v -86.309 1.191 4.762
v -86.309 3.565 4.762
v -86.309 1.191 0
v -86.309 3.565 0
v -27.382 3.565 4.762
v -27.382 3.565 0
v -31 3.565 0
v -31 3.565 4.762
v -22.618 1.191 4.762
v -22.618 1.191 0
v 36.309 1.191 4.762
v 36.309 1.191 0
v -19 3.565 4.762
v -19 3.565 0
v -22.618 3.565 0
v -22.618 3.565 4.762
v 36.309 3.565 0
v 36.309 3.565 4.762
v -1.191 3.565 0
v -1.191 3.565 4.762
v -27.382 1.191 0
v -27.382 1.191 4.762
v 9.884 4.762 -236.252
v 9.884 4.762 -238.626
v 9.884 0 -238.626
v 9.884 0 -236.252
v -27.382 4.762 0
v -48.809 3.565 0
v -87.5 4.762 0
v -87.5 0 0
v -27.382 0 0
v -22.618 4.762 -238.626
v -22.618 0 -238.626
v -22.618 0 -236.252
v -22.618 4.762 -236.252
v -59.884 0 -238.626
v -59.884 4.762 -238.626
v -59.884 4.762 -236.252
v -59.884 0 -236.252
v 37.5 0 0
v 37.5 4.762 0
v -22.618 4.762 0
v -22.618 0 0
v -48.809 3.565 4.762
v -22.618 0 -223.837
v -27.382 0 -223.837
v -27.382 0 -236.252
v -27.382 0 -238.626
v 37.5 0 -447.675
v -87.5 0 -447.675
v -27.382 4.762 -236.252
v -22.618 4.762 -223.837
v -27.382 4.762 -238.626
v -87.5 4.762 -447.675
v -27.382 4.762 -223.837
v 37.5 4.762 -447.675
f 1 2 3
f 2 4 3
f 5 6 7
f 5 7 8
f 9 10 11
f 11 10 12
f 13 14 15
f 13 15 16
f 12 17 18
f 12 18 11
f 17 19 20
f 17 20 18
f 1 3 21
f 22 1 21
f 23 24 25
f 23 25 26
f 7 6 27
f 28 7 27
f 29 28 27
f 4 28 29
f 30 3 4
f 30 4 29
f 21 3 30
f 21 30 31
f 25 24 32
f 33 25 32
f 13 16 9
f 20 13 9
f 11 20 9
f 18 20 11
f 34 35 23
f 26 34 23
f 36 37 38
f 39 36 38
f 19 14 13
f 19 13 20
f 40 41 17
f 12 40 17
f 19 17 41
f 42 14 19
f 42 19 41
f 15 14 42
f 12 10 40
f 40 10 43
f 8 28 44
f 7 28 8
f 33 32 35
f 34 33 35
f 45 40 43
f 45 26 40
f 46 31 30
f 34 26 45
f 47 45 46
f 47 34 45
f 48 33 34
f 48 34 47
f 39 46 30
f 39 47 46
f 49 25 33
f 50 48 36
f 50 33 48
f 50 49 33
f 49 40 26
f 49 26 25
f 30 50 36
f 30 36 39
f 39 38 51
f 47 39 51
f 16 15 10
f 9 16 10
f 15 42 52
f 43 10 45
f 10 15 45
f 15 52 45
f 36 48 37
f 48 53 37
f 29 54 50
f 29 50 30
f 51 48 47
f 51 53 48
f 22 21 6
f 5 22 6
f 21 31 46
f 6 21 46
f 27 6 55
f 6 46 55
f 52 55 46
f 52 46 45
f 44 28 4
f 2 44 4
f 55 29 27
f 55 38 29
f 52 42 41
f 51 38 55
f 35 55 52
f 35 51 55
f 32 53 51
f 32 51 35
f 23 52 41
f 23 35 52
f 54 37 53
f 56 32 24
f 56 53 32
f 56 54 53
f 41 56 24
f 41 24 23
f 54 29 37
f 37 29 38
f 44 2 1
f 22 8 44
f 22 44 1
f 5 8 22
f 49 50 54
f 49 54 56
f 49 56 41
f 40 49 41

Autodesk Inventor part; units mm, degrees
ref_plane "YZ Plane" through (0, 0, 0) normal (1, 0, 0) x (0, 1, 0)
ref_plane "XZ Plane" through (0, 0, 0) normal (0, 1, 0) x (-1, 0, 0)
ref_plane "XY Plane" through (0, 0, 0) normal (0, 0, 1) x (1, 0, 0)
sketch "Sketch1" plane through (0, 0, 0) normal (0, 1, 0) x (-1, 0, 0)
  line L0 (0, 0) -> (50, 0)
  line L1 (50, 0) -> (50, -447.675)
  line L2 (50, -447.675) -> (0, -447.675)
  line L3 (0, -447.675) -> (0, 0)
  dimension "d0" = 50
  dimension "d1" = 447.675
extrude "Extrusion1" add sketch "Sketch1" along normal blind 4.7625
sketch "Sketch2" plane through (-50, 0, 0) normal (0, 0, 1) x (1, 0, 0)
  line L0 (1.1907, 3.5648) -> (1.1907, 1.1907)
  line L1 (50, 0) -> (0, 0) projected
  line L2 (50, 4.7625) -> (0, 4.7625) projected
  line L3 (1.1907, 1.1907) -> (48.8093, 1.1907)
  line L4 (1.1907, 3.5648) -> (48.8093, 3.5648)
  line L5 (48.8093, 3.5648) -> (48.8093, 1.1907)
  line L6 (50, 0) -> (50, 4.7625) projected
extrude "Extrusion2" add sketch "Sketch2" along normal blind 4.7625
sketch "Sketch3" plane through (0, 4.7625, 0) normal (0, 1, 0) x (1, 0, 0)
  line L0 (-50, 447.675) -> (-50, 0) projected
  line L1 (-50, 447.675) -> (-25, 447.675)
  line L2 (0, 447.675) -> (-50, 447.675) projected
  line L3 (-25, 447.675) -> (-25, 382.675)
  line L4 (-31, 382.675) -> (-19, 382.675)
  line L5 (-31, 382.675) -> (-31, 0)
  line L6 (-1.1907, 0) -> (-48.8093, 0) projected
  line L7 (-19, 382.675) -> (-19, 0)
  line L8 (-31, 0) -> (-19, 0)
  point P0 (0, 0)
  dimension "d11" = 25
extrude "Extrusion3" cut sketch "Sketch3" against normal blind 10
sketch "Sketch4" plane through (-50, 0, 4.7625) normal (0, 0, 1) x (1, 0, 0)
  line L0 (31, 3.5648) -> (31, 1.1907) projected
  line L1 (31, 1.1907) -> (31, 3.5648)
  line L2 (19, 3.5648) -> (31, 3.5648) projected
  line L3 (31, 3.5648) -> (19, 3.5648)
  line L4 (19, 3.5648) -> (19, 1.1907)
  line L5 (19, 1.1907) -> (31, 1.1907)
  point P0 (50, 0)
extrude "Extrusion4" cut sketch "Sketch4" against normal blind 10
sketch "Sketch5" plane through (0, 4.7625, 0) normal (0, 1, 0) x (1, 0, 0)
  point P0 (0, 0)
sketch "Sketch6" plane through (-31, 4.7625, -382.675) normal (0, 0, 1) x (1, 0, 0)
  line L0 (12, -4.7625) -> (0, -4.7625) projected
  line L1 (12, 0) -> (12, -4.7625) projected
  line L2 (0, 0) -> (12, 0) projected
  line L3 (0, 0) -> (0, -4.7625) projected
  point P0 (31, -4.7625)
extrude "Extrusion5" add sketch "Sketch6" along normal blind 158.838
sketch "Sketch8" plane through (-31, 4.7625, -223.837) normal (0, 0, 1) x (1, 0, 0)
  line L0 (3.6185, -4.7625) -> (3.6185, 0)
  line L1 (3.6185, 0) -> (8.3815, 0)
  line L2 (8.3815, 0) -> (8.3815, -4.7625)
  line L3 (3.6185, -4.7625) -> (8.3815, -4.7625)
  line L4 (0, -4.7625) -> (12, -4.7625) projected
  line L5 (-19, 0) -> (0, 0) projected
  line L6 (0, 0) -> (3.6185, 0)
  line L7 (12, 0) -> (0, 0) projected
  line L8 (3.6185, -4.7625) -> (0, -4.7625)
  line L9 (0, -4.7625) -> (0, 0) projected
  line L10 (0, -4.7625) -> (0, 0)
  line L11 (8.3815, 0) -> (12, 0)
  line L12 (12, -3.5718) -> (12, -4.7625) projected
  line L13 (12, -4.7625) -> (8.3815, -4.7625)
  line L14 (12, -4.7625) -> (12, 0)
  point P0 (31, -4.7625)
  dimension "d25" = 4.763
extrude "Extrusion6" add sketch "Sketch8" along normal blind 223.837 contours L4 L9 L6 L0 | L2 L7 L14 L12 L4
sketch "Sketch9" plane through (-19, 1.1907, 0) normal (-1, 0, 0) x (0, 0, 1)
  line L0 (0, 2.374) -> (0, 0) projected
  line L1 (4.7625, 0) -> (0, 0) projected
  line L2 (4.7625, 2.374) -> (4.7625, 0) projected
  line L3 (0, 2.374) -> (4.7625, 2.374) projected
  point P0 (0, -1.1907)
extrude "Extrusion7" add sketch "Sketch9" along normal blind 15
sketch "Sketch10" plane through (-22.6185, 3.5648, 0) normal (0, 0, -1) x (-1, 0, 0)
  line L0 (4.763, -2.374) -> (4.763, 0) projected
  line L1 (0, 0) -> (4.763, 0) projected
  line L2 (0, 0) -> (0, -2.374) projected
  line L3 (0, -2.374) -> (4.763, -2.374) projected
  point P0 (-22.6185, -3.5648)
extrude "Extrusion8" cut sketch "Sketch10" against normal blind 15
sketch "Sketch14" plane through (0, 4.7625, 0) normal (0, 1, 0) x (1, 0, 0)
  line L0 (0, 447.675) -> (-50, 447.675) projected
  line L1 (0, 0) -> (0, 447.675) projected
  line L2 (-50, 447.675) -> (-50, 0) projected
  line L3 (-27.3815, 223.837) -> (-27.3815, 0) projected
  line L4 (-22.6185, 223.837) -> (-22.6185, 0) projected
  line L5 (-5, 231.488) -> (-22.6185, 231.488)
  line L6 (-22.6185, 231.488) -> (-22.6185, 233.862)
  line L7 (-22.6185, 233.862) -> (-5, 233.862)
  line L8 (-5, 231.488) -> (-5, 233.862)
  line L9 (-27.3815, 223.837) -> (-22.6185, 223.837) projected
  line L10 (-45, 231.488) -> (-27.3815, 231.488)
  line L11 (-27.3815, 231.488) -> (-27.3815, 233.862)
  line L12 (-27.3815, 233.862) -> (-45, 233.862)
  line L13 (-45, 231.488) -> (-45, 233.862)
  dimension "d35" = 2.374
extrude "Extrusion9" cut sketch "Sketch14" against normal blind 10
sketch "Sketch17" plane through (0, 4.7625, 0) normal (0, 1, 0) x (1, 0, 0)
  line L0 (-50, 447.675) -> (-50, 0) projected
  line L1 (-50, 235.0565) -> (0, 235.0565)
  line L2 (0, 0) -> (0, 447.675) projected
  line L3 (-45, 231.488) -> (-45, 233.862) projected
  line L4 (-45, 236.2515) -> (-45, 238.6255)
  line L5 (-45, 238.6255) -> (-27.3815, 238.6255)
  line L6 (-45, 236.2515) -> (-27.3815, 236.2515)
  line L7 (-27.3815, 238.6255) -> (-27.3815, 236.2515)
  line L8 (-5, 236.2515) -> (-5, 238.6255)
  line L9 (-5, 238.6255) -> (-22.6185, 238.6255)
  line L10 (-5, 236.2515) -> (-22.6185, 236.2515)
  line L11 (-22.6185, 238.6255) -> (-22.6185, 236.2515)
  point P0 (-27.3815, 231.488)
  dimension "d43" = 2.374
extrude "Extrusion10" cut sketch "Sketch17" against normal blind 10
sketch "Sketch18" plane through (0, 4.7625, 0) normal (0, 1, 0) x (1, 0, 0)
  line L0 (-45, 233.862) -> (-45, 231.488) projected
  line L1 (-45, 233.862) -> (-45, 231.488)
  line L2 (-27.3815, 233.862) -> (-45, 233.862) projected
  line L3 (-45, 233.862) -> (-27.3815, 233.862)
  line L4 (-27.3815, 233.862) -> (-27.3815, 231.488) projected
  line L5 (-27.3815, 233.862) -> (-27.3815, 231.488)
  line L6 (-27.3815, 231.488) -> (-45, 231.488)
  line L7 (-22.6185, 231.488) -> (-5, 231.488) projected
  line L8 (-5, 231.488) -> (-22.6185, 231.488)
  line L9 (-22.6185, 231.488) -> (-22.6185, 233.862)
  line L10 (-22.6185, 233.862) -> (-5, 233.862)
  line L11 (-5, 231.488) -> (-5, 233.862) projected
  line L12 (-5, 233.862) -> (-5, 231.488)
  point P0 (0, 0)
extrude "Extrusion11" add sketch "Sketch18" against normal up to surface (4.7625 mm away)
sketch "Sketch19" plane through (0, 4.7625, 0) normal (0, 1, 0) x (1, 0, 0)
  line L0 (0, 0) -> (0, 447.675) projected
  line L1 (0, 0) -> (37.5, 0)
  line L2 (0, 447.675) -> (-50, 447.675) projected
  line L3 (0, 447.675) -> (37.5, 447.675)
  line L4 (37.5, 447.675) -> (37.5, 0)
  line L5 (0, 0) -> (0, 447.675)
  line L6 (-50, 0) -> (-50, 447.675)
  line L7 (-50, 0) -> (-87.5, 0)
  line L8 (-50, 447.675) -> (-87.5, 447.675)
  line L9 (-87.5, 447.675) -> (-87.5, 0)
  dimension "d48" = 37.5
  dimension "d49" = 37.5
extrude "Extrusion12" add sketch "Sketch19" against normal up to surface (4.7625 mm away)
sketch "Sketch20" plane through (-1.1907, 1.1907, 0) normal (0, 0, 1) x (1, 0, 0)
  line L0 (37.4997, 0) -> (0, 0)
  line L1 (0, 2.374) -> (0, 0) projected
  line L2 (0, 0) -> (0, 2.374)
  line L3 (0, 2.374) -> (0, 0)
  line L4 (0, 2.374) -> (37.4997, 2.374)
  line L5 (37.4997, 2.374) -> (37.4997, 0)
  line L6 (-26.1908, -1.1907) -> (-21.4278, -1.1907) projected
  line L7 (-21.4278, 3.5718) -> (-26.1908, 3.5718) projected
  line L8 (-85.1183, 0) -> (-47.6185, 0)
  line L9 (-47.6185, 2.374) -> (-47.6185, 0)
  line L10 (-47.6185, 2.374) -> (-85.1183, 2.374)
  line L11 (-85.1183, 2.374) -> (-85.1183, 0)
extrude "Extrusion13" add sketch "Sketch20" along normal up to surface (4.7625 mm away)
sketch "Sketch21" plane through (0, 4.7625, 0) normal (0, 1, 0) x (1, 0, 0)
  line L0 (-22.6185, 236.2515) -> (-5, 236.2515) projected
  line L1 (-22.6185, 236.2515) -> (9.8845, 236.2515)
  line L2 (-22.6185, 238.6255) -> (-22.6185, 236.2515) projected
  line L3 (9.8845, 238.6255) -> (9.8845, 236.2515)
  line L4 (-22.6185, 238.6255) -> (-22.6185, 236.2515)
  line L5 (-27.3815, 223.837) -> (-22.6185, 223.837) projected
  line L6 (-22.6185, 238.6255) -> (9.8845, 238.6255)
  line L7 (-27.3815, 236.2515) -> (-59.8845, 236.2515)
  line L8 (-27.3815, 238.6255) -> (-27.3815, 236.2515)
  line L9 (-59.8845, 238.6255) -> (-59.8845, 236.2515)
  line L10 (-27.3815, 238.6255) -> (-59.8845, 238.6255)
  point P0 (0, 0)
extrude "Extrusion14" cut sketch "Sketch21" against normal blind 10
properties part number "Sustainable Chair_V2 - Leg(A)_2_CPY" material "Foam Board - V3"
